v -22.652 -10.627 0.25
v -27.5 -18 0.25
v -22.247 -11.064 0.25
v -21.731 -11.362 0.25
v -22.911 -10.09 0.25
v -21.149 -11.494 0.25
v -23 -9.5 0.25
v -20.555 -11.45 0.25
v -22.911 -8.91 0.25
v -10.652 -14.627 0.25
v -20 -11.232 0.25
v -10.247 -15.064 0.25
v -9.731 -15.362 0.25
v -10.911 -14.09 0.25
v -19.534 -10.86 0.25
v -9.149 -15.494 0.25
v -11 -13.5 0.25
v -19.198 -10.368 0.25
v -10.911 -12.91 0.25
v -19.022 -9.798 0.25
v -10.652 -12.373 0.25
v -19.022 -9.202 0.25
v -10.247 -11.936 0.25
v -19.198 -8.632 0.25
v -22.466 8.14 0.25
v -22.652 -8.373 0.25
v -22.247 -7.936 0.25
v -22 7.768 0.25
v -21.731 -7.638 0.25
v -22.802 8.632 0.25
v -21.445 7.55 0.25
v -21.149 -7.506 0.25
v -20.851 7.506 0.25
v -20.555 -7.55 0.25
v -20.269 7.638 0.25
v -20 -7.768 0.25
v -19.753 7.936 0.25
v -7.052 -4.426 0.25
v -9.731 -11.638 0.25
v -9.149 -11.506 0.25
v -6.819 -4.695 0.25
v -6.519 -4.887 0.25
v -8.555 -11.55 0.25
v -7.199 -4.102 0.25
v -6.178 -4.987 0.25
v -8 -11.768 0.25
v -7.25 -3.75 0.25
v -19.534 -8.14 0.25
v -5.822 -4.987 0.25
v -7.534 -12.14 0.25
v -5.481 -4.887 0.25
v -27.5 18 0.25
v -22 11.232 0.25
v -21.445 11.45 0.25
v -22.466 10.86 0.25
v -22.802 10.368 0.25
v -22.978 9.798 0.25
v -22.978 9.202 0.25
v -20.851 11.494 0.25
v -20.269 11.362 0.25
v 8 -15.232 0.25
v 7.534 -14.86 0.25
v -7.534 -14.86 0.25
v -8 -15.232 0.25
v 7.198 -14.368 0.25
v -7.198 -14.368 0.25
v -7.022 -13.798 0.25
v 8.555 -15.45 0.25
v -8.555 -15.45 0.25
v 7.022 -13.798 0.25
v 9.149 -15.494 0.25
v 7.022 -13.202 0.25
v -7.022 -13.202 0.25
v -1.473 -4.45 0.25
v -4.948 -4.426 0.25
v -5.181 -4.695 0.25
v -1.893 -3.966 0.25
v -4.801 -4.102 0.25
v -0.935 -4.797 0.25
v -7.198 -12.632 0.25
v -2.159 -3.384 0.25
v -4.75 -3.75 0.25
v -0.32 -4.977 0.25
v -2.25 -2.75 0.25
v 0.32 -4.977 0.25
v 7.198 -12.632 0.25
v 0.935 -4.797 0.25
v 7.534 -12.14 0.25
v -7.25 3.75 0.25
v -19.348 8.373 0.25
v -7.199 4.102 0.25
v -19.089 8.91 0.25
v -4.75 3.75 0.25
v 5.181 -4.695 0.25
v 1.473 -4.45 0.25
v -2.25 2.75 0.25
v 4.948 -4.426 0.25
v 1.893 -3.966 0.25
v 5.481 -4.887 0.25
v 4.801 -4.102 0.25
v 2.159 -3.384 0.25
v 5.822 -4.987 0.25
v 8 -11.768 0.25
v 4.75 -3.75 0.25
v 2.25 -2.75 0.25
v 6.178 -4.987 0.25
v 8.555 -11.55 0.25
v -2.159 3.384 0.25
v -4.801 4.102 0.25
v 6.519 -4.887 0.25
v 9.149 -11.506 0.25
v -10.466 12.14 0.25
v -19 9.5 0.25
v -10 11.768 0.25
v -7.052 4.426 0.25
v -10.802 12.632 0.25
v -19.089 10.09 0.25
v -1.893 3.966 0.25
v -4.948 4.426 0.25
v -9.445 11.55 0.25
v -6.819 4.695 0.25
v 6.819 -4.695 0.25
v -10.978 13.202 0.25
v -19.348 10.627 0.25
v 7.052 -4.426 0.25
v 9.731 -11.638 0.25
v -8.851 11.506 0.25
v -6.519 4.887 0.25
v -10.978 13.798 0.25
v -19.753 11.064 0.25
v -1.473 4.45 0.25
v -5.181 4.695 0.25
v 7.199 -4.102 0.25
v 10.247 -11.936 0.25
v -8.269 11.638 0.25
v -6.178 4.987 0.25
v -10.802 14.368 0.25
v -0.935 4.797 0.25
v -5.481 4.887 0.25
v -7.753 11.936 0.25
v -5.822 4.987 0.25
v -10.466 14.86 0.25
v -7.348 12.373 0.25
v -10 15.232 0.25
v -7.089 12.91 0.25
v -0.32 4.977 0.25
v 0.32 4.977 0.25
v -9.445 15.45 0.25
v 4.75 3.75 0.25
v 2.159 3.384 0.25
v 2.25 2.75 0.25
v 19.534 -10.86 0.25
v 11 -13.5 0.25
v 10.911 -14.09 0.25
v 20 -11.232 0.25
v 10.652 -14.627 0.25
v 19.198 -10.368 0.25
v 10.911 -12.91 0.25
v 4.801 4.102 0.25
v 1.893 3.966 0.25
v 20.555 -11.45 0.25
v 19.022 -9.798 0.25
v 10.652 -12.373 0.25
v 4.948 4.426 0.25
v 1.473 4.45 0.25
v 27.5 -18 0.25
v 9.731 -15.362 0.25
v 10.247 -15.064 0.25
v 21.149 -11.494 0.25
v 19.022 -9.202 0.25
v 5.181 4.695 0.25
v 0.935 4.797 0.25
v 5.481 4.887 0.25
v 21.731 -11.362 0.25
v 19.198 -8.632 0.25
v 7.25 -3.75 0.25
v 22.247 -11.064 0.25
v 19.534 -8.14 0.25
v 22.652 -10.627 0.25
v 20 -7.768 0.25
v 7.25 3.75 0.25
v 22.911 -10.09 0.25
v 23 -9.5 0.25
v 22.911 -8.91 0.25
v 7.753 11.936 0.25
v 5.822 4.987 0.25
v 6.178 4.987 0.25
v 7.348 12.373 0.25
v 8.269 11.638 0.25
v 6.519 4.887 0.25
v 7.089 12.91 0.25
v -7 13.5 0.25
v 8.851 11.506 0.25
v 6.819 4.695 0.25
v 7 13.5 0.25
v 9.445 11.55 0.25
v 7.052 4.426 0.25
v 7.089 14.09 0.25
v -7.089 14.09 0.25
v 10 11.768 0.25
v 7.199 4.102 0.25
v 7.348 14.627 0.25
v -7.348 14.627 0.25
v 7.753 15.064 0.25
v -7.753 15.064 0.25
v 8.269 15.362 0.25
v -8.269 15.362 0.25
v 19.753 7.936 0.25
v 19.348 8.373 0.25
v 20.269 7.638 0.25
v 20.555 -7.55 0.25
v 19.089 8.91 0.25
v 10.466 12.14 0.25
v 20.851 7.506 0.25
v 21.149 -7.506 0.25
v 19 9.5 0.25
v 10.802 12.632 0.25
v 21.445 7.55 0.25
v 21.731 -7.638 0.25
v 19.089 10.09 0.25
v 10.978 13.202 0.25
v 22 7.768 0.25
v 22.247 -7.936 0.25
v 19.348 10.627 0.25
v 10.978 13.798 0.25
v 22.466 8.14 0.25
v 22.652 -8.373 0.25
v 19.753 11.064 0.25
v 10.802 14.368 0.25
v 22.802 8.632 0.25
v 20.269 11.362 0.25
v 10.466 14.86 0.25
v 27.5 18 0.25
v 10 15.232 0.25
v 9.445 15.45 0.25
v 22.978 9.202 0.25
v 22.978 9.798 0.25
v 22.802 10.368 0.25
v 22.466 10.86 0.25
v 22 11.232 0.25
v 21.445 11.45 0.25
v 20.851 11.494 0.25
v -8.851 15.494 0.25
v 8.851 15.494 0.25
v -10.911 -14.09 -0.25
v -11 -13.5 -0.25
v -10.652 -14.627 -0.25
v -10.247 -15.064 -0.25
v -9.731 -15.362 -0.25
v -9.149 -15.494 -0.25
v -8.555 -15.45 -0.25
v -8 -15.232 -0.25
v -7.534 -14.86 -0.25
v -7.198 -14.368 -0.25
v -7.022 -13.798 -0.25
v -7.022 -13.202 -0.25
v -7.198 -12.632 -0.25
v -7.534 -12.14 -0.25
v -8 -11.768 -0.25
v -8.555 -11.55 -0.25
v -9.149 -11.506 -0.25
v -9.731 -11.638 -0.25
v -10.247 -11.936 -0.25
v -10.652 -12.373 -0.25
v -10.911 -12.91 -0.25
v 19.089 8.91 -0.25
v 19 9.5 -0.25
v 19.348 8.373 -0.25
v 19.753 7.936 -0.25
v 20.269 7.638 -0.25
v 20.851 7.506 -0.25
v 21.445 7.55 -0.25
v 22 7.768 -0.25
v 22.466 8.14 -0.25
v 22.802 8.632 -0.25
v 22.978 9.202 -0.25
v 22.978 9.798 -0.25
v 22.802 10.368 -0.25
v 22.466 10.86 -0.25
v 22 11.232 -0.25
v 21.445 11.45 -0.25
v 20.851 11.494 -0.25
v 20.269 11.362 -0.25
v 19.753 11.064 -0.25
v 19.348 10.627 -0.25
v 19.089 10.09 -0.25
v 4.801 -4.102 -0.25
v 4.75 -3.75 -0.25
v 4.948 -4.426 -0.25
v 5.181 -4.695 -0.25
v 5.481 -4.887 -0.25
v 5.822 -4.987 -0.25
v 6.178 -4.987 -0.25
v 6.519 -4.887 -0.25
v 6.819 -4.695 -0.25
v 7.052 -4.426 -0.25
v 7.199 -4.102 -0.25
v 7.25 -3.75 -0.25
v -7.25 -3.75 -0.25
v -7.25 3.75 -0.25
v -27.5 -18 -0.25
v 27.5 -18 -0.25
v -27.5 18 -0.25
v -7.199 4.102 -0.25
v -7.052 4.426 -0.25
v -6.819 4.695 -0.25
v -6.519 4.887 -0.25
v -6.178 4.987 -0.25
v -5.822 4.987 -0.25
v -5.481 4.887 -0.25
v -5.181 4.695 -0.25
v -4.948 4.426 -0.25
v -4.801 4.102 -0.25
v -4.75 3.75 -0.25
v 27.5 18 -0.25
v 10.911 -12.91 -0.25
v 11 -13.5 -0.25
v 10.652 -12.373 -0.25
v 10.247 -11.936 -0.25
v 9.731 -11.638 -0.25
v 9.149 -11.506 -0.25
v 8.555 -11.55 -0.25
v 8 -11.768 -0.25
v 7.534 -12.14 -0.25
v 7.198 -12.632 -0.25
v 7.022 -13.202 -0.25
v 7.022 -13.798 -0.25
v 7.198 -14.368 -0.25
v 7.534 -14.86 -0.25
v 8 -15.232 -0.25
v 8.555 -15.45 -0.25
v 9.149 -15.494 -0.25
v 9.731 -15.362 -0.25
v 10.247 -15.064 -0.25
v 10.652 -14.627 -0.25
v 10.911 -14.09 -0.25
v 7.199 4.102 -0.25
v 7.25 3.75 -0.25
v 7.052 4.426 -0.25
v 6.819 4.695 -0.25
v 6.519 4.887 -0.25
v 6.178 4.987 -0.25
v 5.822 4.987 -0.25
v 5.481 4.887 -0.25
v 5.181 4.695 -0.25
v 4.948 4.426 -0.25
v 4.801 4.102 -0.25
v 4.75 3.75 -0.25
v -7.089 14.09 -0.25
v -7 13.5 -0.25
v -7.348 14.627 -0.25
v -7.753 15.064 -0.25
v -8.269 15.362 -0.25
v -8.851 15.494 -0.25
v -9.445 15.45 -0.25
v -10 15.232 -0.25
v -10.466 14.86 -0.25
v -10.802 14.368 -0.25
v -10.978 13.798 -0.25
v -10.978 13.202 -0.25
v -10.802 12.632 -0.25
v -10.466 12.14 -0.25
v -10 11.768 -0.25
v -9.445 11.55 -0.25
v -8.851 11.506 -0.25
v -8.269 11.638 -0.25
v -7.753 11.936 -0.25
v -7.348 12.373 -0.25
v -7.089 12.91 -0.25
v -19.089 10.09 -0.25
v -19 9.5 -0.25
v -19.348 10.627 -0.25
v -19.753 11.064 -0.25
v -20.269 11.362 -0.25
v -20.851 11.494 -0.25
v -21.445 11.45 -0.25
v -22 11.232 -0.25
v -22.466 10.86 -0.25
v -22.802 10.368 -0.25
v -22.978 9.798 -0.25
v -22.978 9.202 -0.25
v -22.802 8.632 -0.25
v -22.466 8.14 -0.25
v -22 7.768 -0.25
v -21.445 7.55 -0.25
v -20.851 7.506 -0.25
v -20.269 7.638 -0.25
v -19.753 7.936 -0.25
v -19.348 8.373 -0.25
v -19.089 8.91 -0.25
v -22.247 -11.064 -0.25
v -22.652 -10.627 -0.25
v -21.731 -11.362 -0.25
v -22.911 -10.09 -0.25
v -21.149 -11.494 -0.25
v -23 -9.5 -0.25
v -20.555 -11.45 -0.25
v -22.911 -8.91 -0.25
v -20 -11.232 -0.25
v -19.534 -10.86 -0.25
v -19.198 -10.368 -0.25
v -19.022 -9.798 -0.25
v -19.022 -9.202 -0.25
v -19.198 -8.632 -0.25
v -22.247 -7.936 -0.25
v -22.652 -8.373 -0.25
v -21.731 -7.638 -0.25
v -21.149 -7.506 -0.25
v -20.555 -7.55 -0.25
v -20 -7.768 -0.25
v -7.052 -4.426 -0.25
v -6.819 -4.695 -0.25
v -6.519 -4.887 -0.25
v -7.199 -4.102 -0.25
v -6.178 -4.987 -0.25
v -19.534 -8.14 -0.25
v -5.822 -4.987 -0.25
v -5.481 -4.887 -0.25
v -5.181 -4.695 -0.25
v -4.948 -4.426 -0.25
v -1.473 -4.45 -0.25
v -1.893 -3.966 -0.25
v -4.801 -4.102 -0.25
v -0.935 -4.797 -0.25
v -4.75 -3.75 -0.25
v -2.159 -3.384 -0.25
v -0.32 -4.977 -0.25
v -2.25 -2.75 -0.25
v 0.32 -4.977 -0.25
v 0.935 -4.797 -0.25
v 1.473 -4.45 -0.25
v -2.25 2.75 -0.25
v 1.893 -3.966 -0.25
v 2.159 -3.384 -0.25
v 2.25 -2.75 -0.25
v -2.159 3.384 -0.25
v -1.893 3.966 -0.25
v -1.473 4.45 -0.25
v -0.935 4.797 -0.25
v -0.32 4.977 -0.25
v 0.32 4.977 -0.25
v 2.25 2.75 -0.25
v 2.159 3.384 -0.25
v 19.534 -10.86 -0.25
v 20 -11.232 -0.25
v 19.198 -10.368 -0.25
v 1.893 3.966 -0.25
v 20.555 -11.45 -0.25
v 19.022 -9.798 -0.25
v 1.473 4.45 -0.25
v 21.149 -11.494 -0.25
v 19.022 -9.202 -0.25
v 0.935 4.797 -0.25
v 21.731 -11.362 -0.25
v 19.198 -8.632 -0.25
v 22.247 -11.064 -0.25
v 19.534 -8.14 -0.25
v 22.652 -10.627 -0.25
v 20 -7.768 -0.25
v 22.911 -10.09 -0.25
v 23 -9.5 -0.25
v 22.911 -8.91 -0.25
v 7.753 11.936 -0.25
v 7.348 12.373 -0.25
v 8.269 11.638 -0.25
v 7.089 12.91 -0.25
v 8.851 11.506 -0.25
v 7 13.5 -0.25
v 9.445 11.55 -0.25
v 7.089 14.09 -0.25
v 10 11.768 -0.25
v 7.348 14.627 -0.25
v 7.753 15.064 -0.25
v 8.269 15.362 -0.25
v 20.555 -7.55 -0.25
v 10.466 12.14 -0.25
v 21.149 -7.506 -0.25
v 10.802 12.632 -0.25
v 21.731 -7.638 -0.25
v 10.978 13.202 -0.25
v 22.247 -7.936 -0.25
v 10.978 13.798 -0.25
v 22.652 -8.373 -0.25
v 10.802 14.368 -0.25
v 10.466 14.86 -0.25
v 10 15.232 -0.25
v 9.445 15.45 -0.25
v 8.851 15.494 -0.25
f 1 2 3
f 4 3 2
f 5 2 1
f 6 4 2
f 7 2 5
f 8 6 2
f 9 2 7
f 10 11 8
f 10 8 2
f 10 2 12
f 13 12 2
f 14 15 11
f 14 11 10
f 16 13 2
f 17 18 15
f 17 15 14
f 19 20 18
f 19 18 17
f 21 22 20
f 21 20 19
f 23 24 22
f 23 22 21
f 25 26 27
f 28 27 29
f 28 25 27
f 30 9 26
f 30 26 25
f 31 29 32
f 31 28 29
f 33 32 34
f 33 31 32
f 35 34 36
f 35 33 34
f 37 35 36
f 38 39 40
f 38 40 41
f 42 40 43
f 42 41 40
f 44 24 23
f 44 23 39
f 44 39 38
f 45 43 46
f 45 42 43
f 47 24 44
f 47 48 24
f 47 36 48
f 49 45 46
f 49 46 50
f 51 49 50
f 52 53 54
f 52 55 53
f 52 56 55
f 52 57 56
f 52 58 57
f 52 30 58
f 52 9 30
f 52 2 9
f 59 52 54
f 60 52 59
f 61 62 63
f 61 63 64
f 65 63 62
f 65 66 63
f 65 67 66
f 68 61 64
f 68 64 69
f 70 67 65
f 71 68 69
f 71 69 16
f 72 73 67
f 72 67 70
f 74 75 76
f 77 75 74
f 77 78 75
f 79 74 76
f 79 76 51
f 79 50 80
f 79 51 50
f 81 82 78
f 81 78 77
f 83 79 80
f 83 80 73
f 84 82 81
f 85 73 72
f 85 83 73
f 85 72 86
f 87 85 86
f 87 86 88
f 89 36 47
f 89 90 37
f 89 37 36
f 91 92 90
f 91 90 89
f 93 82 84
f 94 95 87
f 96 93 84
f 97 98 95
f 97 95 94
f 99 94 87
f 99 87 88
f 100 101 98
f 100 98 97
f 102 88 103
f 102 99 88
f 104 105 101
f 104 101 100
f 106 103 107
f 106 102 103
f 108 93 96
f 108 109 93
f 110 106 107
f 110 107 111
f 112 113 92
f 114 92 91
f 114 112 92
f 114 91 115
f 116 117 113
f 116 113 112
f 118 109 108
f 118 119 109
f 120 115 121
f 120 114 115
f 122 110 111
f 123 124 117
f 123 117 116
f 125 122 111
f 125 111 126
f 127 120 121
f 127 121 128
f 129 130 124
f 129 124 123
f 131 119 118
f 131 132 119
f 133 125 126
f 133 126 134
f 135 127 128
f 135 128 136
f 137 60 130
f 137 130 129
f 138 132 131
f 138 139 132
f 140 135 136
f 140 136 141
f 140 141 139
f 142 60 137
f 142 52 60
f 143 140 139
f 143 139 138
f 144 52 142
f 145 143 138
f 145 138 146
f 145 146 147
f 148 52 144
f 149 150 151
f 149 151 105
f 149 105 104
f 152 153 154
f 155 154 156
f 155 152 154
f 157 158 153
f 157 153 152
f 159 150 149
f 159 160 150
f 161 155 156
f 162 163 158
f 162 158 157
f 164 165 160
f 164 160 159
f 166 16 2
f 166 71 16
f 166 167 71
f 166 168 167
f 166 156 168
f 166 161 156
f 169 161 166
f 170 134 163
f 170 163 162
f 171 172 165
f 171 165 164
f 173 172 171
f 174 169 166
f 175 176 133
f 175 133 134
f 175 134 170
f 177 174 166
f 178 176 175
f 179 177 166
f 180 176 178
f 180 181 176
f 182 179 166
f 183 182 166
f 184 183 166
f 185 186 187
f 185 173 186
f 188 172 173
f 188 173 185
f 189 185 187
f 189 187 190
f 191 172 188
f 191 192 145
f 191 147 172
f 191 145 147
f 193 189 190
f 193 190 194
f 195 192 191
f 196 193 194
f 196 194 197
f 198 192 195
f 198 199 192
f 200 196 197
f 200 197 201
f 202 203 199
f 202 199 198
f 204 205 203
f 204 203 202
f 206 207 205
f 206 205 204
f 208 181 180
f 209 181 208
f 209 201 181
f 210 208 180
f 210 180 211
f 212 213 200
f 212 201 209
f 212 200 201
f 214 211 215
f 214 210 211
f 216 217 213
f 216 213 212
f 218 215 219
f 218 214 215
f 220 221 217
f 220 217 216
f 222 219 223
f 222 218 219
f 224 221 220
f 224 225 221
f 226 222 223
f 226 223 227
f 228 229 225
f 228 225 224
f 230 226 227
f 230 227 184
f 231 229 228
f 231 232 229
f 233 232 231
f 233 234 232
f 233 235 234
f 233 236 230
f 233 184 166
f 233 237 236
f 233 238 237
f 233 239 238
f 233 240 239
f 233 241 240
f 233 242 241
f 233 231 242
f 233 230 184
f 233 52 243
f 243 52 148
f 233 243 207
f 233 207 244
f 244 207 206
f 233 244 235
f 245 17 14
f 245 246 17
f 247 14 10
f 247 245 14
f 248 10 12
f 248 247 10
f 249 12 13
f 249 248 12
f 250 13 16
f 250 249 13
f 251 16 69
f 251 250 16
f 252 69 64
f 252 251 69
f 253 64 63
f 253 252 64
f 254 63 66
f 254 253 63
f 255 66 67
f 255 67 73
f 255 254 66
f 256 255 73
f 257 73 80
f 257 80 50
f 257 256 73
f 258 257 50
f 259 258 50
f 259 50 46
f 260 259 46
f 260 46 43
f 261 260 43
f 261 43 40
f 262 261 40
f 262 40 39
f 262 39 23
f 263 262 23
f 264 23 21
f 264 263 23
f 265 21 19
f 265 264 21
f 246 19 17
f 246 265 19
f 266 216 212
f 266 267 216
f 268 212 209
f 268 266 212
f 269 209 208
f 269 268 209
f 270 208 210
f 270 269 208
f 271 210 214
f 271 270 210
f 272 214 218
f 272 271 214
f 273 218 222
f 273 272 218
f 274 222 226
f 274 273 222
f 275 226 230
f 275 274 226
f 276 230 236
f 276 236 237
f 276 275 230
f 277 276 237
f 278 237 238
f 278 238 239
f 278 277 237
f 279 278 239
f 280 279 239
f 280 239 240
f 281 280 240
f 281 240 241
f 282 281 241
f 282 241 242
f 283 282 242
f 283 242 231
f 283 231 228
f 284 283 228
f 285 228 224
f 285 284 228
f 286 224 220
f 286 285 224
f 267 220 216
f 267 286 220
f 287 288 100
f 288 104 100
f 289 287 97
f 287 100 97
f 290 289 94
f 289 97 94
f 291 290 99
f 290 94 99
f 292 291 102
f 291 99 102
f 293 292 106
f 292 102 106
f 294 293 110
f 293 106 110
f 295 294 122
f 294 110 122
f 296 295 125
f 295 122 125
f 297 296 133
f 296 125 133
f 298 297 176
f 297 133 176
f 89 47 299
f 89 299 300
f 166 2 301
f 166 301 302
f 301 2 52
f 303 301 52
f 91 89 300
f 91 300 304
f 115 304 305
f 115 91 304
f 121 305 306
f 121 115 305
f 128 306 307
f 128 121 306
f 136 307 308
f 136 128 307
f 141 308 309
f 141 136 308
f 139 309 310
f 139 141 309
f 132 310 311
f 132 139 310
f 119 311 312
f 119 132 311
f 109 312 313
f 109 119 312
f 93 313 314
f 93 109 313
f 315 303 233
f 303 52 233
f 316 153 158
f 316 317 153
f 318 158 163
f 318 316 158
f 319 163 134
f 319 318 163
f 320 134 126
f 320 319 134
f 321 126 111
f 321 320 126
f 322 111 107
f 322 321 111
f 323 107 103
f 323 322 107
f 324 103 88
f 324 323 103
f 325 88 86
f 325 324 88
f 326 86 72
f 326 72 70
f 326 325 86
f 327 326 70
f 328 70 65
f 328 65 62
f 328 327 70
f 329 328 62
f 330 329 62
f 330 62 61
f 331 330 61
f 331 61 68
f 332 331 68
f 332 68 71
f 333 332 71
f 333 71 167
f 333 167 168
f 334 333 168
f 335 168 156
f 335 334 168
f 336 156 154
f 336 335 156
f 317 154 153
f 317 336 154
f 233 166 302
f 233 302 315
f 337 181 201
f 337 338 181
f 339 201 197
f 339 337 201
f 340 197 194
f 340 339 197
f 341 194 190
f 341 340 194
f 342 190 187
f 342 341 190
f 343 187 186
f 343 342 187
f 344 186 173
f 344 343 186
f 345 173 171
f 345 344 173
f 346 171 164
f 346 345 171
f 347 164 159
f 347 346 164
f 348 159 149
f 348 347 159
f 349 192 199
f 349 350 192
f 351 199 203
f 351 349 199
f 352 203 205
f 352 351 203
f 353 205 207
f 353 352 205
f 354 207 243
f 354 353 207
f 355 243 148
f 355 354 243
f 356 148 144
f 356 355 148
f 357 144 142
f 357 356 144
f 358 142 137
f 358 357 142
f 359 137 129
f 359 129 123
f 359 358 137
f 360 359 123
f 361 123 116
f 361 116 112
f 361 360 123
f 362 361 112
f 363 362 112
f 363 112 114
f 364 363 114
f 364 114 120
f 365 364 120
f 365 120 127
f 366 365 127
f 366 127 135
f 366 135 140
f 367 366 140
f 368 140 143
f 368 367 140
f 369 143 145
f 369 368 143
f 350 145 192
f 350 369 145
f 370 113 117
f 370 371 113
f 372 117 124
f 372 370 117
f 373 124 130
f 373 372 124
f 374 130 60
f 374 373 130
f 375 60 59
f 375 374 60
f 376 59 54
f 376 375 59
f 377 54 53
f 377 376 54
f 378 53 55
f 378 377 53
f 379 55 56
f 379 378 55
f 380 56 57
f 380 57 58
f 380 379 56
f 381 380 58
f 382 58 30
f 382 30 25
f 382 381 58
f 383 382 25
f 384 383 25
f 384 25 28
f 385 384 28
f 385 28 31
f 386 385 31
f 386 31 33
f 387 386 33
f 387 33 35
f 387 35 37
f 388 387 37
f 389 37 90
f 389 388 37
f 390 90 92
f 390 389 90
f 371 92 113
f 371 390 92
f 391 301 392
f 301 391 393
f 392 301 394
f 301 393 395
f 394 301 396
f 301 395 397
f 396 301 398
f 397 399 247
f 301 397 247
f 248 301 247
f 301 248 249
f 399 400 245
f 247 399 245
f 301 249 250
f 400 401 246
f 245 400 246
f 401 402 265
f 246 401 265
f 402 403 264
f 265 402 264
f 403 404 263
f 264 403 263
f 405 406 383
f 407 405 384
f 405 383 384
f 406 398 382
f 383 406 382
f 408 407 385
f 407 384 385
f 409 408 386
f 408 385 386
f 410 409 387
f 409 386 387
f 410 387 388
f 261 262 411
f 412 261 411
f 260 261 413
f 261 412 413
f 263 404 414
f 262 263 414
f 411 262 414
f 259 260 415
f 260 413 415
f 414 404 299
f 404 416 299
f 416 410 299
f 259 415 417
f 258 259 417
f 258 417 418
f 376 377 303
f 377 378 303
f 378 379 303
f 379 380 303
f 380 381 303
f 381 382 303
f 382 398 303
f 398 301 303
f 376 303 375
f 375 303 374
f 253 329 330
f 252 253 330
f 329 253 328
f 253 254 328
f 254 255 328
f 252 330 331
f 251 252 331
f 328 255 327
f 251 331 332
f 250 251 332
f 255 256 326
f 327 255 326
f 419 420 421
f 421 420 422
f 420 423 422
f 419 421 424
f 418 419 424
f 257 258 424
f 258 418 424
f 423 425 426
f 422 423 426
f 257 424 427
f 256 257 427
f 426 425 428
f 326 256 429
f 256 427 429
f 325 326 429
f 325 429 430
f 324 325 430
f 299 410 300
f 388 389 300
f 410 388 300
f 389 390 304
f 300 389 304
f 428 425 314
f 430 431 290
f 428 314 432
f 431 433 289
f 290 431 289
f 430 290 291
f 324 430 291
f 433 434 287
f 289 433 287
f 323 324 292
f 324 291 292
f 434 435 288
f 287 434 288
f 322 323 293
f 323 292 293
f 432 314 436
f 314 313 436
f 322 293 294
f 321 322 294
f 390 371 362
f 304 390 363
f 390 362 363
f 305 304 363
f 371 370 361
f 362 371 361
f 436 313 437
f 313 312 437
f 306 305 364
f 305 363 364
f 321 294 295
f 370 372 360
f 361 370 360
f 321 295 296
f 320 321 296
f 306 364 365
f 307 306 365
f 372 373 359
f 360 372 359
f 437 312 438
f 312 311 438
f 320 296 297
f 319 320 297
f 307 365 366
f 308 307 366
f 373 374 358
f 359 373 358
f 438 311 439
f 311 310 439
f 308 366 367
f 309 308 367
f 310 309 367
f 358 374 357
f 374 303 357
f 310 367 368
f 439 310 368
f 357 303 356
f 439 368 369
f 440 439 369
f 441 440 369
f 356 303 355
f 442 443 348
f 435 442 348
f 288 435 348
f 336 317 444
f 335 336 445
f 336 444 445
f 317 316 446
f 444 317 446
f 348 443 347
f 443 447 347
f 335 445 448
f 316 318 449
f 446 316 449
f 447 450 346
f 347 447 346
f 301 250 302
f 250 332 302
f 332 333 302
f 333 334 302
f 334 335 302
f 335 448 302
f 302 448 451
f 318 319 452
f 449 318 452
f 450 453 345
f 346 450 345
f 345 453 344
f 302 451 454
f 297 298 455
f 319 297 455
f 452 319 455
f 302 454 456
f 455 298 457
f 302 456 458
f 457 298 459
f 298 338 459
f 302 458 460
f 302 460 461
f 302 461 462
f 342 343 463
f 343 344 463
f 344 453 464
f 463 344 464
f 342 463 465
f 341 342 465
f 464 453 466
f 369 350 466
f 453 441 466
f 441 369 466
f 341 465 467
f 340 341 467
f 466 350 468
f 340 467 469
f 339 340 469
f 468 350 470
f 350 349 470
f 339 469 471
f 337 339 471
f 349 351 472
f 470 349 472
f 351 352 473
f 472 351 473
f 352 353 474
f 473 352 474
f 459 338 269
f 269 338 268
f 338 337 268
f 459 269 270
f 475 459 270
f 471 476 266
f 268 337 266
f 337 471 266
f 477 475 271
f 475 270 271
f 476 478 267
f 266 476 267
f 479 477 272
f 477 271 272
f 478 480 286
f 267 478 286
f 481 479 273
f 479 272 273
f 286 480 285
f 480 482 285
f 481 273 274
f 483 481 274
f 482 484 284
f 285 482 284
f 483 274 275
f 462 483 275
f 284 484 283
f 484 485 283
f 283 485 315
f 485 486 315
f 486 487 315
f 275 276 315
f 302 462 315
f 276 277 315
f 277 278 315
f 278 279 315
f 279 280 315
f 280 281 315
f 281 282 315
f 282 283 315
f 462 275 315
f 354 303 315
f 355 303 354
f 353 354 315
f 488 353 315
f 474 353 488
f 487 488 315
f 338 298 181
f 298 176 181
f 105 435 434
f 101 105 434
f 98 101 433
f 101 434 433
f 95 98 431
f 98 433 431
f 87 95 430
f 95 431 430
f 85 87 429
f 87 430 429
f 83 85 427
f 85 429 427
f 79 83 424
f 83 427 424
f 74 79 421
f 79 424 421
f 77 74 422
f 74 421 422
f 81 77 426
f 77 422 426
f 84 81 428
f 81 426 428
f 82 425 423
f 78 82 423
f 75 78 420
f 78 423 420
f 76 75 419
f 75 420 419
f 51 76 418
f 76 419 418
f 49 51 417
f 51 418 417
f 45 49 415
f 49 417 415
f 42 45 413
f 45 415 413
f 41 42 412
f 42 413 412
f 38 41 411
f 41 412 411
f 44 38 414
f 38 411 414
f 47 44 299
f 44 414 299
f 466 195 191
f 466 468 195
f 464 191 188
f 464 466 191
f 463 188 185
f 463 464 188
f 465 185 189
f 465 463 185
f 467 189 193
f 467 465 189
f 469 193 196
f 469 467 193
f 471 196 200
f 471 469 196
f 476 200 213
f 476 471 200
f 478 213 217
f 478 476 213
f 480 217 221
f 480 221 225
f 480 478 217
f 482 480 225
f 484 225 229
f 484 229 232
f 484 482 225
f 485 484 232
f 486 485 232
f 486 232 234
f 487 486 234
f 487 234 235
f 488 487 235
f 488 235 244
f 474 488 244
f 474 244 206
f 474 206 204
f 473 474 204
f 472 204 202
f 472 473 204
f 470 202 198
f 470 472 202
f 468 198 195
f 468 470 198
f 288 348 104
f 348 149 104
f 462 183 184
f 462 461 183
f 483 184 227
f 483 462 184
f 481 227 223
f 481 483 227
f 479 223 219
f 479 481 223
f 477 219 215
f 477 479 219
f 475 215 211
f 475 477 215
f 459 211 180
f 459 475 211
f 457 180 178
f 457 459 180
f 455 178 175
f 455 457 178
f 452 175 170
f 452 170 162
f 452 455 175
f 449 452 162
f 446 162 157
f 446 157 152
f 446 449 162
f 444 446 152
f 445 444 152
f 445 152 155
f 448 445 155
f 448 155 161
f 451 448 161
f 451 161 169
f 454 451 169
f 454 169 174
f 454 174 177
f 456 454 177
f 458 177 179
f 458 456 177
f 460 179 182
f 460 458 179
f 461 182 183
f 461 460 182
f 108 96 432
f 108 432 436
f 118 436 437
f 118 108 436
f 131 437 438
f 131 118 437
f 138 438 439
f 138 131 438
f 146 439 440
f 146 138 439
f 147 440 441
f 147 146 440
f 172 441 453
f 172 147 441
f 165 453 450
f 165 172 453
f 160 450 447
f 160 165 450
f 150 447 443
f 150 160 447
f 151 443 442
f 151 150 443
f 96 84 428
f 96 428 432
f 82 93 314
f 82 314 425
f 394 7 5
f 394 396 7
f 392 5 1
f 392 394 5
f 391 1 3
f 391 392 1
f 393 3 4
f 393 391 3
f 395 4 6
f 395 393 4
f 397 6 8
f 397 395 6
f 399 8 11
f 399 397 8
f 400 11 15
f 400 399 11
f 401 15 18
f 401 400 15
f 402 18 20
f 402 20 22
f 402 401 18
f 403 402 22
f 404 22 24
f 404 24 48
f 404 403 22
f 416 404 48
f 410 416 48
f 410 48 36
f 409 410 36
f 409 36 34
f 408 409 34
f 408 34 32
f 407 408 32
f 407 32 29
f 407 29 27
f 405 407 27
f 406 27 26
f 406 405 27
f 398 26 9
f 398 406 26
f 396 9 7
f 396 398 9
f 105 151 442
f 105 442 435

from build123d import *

# Parameters (mm, degrees)
SKETCH1_W           = 55
SKETCH1_H           = 36
SKETCH1_R           = 2
BOSS_EXTRUDE1_DEPTH = 0.25


with BuildPart() as part:
    # Sketch1 → Boss-Extrude1 (new, symmetric)
    with BuildSketch(Plane.XY):
        Rectangle(SKETCH1_W, SKETCH1_H)
        with Locations((-9, 13.5)):
            Circle(SKETCH1_R, mode=Mode.SUBTRACT)
        with Locations((-21, 9.5)):
            Circle(SKETCH1_R, mode=Mode.SUBTRACT)
        with Locations(Location((-9, -13.5, 0), (0, 0, 180))):
            Circle(SKETCH1_R, mode=Mode.SUBTRACT)
        with Locations(Location((-21, -9.5, 0), (0, 0, 180))):
            Circle(SKETCH1_R, mode=Mode.SUBTRACT)
        with Locations((9, -13.5)):
            Circle(SKETCH1_R, mode=Mode.SUBTRACT)
        with Locations((21, -9.5)):
            Circle(SKETCH1_R, mode=Mode.SUBTRACT)
        with Locations(Location((9, 13.5, 0), (0, 0, 180))):
            Circle(SKETCH1_R, mode=Mode.SUBTRACT)
        with Locations(Location((21, 9.5, 0), (0, 0, 180))):
            Circle(SKETCH1_R, mode=Mode.SUBTRACT)
        with BuildLine():
            Line((2.25, 2.75), (2.25, -2.75))
            ThreePointArc((2.25, -2.75), (0, -5), (-2.25, -2.75))
            Line((-2.25, -2.75), (-2.25, 2.75))
            ThreePointArc((-2.25, 2.75), (0, 5), (2.25, 2.75))
        make_face(mode=Mode.SUBTRACT)
        with BuildLine():
            Line((-4.75, 3.75), (-4.75, -3.75))
            ThreePointArc((-4.75, -3.75), (-6, -5), (-7.25, -3.75))
            Line((-7.25, -3.75), (-7.25, 3.75))
            ThreePointArc((-7.25, 3.75), (-6, 5), (-4.75, 3.75))
        make_face(mode=Mode.SUBTRACT)
        with BuildLine():
            Line((4.75, 3.75), (4.75, -3.75))
            ThreePointArc((4.75, -3.75), (6, -5), (7.25, -3.75))
            Line((7.25, -3.75), (7.25, 3.75))
            ThreePointArc((7.25, 3.75), (6, 5), (4.75, 3.75))
        make_face(mode=Mode.SUBTRACT)
    extrude(amount=BOSS_EXTRUDE1_DEPTH, both=True)


solid = part.part
